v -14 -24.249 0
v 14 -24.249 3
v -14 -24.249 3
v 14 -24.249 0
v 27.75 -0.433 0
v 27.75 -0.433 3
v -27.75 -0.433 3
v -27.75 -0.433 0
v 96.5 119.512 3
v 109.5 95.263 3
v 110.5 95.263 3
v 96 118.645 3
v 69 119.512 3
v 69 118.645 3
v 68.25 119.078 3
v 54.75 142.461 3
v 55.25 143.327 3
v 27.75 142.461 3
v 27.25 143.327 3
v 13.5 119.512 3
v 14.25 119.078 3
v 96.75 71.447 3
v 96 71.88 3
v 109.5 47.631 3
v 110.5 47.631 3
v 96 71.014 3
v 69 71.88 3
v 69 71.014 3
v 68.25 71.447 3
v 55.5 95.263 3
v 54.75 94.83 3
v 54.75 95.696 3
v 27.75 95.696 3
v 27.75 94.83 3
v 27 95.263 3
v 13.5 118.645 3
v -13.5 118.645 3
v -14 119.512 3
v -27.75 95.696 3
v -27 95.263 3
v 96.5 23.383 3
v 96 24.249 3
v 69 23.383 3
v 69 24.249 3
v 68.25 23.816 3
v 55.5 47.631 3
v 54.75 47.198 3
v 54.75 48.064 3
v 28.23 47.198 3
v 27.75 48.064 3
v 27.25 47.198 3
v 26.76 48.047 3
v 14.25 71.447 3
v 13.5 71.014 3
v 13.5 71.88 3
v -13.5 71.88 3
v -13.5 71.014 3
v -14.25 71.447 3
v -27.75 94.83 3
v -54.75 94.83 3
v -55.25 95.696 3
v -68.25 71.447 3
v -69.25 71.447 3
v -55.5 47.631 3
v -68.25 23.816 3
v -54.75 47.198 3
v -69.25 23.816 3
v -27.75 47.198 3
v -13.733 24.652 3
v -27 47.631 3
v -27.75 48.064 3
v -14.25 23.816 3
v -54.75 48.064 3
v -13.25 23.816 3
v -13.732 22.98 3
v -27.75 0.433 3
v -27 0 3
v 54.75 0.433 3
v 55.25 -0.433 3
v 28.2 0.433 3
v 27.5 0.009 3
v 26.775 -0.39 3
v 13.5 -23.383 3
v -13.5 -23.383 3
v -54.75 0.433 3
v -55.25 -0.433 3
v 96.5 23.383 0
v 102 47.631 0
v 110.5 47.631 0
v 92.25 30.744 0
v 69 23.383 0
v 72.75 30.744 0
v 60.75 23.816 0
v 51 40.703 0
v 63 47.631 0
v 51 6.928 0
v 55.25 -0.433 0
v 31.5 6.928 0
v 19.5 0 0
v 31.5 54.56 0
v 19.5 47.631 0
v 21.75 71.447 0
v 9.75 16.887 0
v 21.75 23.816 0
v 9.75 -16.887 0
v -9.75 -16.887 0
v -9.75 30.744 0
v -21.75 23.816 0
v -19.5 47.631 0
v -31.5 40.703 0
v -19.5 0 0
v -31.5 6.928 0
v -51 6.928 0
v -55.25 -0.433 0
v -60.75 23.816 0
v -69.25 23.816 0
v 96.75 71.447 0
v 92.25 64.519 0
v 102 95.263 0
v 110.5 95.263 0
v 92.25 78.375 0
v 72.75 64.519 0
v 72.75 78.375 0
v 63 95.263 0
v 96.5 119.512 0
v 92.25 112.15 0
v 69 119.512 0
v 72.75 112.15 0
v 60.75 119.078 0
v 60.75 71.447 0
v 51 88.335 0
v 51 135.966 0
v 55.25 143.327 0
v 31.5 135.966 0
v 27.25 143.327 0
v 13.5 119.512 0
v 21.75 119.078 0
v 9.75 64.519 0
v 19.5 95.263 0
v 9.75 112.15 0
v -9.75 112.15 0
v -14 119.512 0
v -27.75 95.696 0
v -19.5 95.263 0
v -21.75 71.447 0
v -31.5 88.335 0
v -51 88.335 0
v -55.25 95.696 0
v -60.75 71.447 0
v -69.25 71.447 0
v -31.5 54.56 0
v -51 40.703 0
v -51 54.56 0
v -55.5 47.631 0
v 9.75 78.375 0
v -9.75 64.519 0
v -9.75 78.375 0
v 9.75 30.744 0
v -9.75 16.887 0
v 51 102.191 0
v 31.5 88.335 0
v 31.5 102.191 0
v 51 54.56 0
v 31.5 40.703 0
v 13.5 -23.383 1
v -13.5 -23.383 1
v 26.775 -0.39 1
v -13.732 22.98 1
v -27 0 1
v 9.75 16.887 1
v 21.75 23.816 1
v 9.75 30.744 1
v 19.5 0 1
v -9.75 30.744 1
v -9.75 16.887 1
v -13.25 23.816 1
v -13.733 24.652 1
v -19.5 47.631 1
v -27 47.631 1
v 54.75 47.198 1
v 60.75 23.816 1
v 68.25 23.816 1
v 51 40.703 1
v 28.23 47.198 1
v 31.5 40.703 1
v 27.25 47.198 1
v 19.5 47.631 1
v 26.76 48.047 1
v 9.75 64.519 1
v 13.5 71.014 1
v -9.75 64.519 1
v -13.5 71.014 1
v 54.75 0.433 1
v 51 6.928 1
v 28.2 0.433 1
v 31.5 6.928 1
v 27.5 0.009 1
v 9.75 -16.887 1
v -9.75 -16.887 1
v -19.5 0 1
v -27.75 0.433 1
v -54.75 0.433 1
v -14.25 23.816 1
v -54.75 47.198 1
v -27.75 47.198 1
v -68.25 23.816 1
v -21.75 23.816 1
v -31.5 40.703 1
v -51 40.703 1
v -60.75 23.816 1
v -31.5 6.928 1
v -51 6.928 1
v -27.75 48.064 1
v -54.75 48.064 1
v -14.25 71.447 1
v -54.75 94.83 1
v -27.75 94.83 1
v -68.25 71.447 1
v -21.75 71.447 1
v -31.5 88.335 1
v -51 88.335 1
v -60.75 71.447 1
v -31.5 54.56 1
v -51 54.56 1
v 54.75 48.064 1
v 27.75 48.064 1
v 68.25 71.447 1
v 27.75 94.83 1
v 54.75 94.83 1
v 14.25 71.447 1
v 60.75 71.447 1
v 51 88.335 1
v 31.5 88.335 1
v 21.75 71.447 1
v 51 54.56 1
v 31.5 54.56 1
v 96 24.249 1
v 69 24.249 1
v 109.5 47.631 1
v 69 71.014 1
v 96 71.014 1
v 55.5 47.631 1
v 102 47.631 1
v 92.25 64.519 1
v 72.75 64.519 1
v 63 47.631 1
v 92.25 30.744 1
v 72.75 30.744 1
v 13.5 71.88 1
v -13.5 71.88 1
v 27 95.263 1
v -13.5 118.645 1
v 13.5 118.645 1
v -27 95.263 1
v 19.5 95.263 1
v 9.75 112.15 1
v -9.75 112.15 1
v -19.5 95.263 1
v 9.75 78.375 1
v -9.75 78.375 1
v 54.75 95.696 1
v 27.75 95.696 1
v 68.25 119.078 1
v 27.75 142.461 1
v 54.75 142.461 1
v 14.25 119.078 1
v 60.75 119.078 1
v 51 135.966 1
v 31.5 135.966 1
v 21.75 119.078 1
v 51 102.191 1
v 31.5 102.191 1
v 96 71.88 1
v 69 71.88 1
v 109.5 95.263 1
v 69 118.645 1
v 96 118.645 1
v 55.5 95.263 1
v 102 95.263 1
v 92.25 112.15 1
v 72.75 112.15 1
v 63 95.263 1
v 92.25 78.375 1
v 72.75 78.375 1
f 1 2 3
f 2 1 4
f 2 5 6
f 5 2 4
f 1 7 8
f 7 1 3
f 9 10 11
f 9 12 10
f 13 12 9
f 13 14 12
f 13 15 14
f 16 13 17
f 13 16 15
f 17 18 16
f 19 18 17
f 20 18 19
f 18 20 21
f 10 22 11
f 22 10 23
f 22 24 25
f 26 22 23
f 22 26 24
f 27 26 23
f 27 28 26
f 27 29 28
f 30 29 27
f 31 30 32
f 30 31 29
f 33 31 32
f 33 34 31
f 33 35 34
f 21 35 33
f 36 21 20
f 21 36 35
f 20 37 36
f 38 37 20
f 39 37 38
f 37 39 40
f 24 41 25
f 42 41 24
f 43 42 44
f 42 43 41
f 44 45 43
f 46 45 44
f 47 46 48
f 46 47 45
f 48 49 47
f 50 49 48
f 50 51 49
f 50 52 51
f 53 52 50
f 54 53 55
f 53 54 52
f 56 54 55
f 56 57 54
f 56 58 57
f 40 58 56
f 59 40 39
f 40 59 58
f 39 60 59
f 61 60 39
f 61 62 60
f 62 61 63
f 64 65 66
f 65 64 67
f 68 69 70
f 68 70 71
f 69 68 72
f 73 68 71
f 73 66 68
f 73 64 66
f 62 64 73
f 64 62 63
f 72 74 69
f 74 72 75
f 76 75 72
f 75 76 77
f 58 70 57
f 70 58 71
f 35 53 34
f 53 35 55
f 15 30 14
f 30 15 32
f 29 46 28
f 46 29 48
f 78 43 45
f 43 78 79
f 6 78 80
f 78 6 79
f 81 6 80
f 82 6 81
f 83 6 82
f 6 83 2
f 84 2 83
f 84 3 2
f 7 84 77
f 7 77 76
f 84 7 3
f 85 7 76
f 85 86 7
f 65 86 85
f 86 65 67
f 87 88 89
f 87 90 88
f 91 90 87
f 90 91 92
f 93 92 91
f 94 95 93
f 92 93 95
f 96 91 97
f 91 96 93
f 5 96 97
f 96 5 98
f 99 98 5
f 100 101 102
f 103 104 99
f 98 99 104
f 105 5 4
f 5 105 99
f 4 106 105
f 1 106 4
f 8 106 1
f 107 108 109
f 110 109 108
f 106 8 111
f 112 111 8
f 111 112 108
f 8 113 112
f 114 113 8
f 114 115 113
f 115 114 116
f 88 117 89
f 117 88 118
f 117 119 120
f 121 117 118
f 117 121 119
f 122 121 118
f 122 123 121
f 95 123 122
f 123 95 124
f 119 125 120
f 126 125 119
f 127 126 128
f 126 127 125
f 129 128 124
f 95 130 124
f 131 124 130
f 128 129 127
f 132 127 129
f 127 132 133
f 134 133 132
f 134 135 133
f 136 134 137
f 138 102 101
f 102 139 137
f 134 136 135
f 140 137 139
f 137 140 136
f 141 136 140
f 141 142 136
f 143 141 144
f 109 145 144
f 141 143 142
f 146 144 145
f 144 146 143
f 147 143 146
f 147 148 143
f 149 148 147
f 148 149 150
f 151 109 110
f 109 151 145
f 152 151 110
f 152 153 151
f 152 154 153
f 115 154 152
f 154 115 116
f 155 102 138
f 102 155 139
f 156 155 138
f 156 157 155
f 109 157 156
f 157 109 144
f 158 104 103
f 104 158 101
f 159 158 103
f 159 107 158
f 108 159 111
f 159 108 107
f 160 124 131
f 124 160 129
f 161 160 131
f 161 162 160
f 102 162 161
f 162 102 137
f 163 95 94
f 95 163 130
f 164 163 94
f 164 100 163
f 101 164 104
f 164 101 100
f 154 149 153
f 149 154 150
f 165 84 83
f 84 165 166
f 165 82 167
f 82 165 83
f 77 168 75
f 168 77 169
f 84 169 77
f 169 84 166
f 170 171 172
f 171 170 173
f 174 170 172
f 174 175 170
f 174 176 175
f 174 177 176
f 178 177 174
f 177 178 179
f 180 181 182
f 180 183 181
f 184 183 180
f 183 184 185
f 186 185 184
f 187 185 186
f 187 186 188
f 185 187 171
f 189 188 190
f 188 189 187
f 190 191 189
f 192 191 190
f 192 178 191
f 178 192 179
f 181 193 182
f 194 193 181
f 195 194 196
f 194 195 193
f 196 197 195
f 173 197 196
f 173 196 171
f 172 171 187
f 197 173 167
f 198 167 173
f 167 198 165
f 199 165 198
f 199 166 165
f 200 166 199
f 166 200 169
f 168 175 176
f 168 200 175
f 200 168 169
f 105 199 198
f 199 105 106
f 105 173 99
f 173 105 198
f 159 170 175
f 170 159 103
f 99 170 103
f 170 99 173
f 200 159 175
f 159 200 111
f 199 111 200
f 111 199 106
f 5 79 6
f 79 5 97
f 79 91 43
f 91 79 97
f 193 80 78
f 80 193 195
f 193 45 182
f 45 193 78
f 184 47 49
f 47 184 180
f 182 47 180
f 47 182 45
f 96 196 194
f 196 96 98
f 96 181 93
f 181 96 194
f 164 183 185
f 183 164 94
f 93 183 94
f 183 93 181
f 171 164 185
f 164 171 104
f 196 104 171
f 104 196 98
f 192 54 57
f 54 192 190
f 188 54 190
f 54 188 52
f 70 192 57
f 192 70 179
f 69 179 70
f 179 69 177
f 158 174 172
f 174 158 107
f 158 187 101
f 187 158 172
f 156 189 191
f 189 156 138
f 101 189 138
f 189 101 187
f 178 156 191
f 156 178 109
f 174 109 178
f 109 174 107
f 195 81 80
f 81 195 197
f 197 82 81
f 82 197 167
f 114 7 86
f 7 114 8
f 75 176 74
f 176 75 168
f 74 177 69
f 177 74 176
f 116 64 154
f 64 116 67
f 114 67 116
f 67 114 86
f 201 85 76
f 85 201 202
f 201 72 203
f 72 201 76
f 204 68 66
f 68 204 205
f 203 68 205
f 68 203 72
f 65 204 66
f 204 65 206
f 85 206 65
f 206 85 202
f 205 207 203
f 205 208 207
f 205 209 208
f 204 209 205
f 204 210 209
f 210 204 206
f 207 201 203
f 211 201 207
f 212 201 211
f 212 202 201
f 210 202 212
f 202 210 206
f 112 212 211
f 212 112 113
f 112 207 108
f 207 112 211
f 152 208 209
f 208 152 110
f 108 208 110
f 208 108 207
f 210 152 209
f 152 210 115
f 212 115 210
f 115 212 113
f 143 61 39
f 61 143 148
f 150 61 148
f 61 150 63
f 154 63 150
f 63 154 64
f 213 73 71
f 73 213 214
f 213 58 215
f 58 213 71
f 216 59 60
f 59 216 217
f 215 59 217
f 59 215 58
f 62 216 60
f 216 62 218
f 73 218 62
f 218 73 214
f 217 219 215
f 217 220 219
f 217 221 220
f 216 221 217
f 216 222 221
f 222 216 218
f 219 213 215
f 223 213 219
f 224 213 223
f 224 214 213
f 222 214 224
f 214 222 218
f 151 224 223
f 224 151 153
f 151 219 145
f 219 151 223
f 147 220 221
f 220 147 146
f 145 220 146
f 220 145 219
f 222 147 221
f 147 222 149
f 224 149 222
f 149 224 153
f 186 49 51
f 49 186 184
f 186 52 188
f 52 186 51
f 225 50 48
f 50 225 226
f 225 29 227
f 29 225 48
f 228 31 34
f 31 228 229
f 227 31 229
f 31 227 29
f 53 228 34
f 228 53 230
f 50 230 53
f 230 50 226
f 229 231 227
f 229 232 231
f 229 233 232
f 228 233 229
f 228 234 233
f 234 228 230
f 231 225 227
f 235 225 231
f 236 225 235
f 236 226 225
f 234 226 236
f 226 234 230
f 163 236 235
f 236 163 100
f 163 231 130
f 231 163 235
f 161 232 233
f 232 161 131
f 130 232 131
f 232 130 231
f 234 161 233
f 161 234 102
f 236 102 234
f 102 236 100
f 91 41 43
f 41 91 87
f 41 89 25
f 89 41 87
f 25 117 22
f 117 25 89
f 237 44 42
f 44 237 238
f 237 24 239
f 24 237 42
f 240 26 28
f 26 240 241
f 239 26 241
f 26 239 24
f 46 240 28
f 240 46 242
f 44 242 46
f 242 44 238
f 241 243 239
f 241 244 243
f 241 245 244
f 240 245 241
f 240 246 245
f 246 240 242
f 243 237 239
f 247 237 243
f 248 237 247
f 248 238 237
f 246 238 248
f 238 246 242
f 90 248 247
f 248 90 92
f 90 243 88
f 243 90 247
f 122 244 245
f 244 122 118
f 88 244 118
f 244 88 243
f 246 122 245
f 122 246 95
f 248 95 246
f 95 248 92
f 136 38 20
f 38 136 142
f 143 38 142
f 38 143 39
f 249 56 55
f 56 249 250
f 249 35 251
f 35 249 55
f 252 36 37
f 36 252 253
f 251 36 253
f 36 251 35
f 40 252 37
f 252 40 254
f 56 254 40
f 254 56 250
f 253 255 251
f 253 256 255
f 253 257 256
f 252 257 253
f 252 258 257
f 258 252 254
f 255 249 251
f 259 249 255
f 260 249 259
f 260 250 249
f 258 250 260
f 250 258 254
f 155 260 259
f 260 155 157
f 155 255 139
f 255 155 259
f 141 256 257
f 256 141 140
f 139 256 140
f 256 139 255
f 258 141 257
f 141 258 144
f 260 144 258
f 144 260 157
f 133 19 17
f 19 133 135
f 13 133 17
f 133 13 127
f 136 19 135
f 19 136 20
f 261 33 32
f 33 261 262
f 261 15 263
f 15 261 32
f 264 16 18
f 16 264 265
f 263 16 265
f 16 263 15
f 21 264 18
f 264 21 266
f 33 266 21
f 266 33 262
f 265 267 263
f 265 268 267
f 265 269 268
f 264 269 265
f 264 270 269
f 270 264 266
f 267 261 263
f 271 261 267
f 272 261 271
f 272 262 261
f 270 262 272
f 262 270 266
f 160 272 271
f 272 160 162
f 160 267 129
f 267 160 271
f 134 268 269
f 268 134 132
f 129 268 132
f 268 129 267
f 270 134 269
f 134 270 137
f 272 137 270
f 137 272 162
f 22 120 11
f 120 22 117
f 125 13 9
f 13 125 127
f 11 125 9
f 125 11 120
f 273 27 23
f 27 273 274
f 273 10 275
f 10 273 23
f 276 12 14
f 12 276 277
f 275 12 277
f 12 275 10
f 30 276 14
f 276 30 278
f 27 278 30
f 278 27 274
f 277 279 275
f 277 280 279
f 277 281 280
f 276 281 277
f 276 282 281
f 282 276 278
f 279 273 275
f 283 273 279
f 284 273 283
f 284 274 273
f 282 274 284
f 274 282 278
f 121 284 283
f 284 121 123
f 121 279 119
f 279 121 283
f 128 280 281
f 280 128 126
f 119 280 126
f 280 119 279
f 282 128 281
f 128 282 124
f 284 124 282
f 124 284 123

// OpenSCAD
$fn = 150;

union() {
	difference() {
		union() {
			translate(v = [0.0, 0.0, 0]) {
				difference() {
					cylinder($fn = 6, d = 56.0, h = 3.0);
					translate(v = [0, 0, 1.0]) {
						cylinder($fn = 6, d = 54.0, h = 3.0);
					}
					translate(v = [0, 0, -1]) {
						cylinder($fn = 6, d = 39, h = 3.0);
					}
				}
			}
			translate(v = [41.25, 23.81569860407206, 0]) {
				difference() {
					cylinder($fn = 6, d = 56.0, h = 3.0);
					translate(v = [0, 0, 1.0]) {
						cylinder($fn = 6, d = 54.0, h = 3.0);
					}
					translate(v = [0, 0, -1]) {
						cylinder($fn = 6, d = 39, h = 3.0);
					}
				}
			}
			translate(v = [0.0, 47.63139720814412, 0]) {
				difference() {
					cylinder($fn = 6, d = 56.0, h = 3.0);
					translate(v = [0, 0, 1.0]) {
						cylinder($fn = 6, d = 54.0, h = 3.0);
					}
					translate(v = [0, 0, -1]) {
						cylinder($fn = 6, d = 39, h = 3.0);
					}
				}
			}
		}
		translate(v = [13.75, 23.824673200287624, 1.0]) {
			cylinder(d = 55.0, h = 3.5);
		}
	}
	translate(v = [-41.25, 23.81569860407206, 0]) {
		difference() {
			cylinder($fn = 6, d = 56.0, h = 3.0);
			translate(v = [0, 0, 1.0]) {
				cylinder($fn = 6, d = 54.0, h = 3.0);
			}
			translate(v = [0, 0, -1]) {
				cylinder($fn = 6, d = 39, h = 3.0);
			}
		}
	}
	translate(v = [-41.25, 71.44709581221619, 0]) {
		difference() {
			cylinder($fn = 6, d = 56.0, h = 3.0);
			translate(v = [0, 0, 1.0]) {
				cylinder($fn = 6, d = 54.0, h = 3.0);
			}
			translate(v = [0, 0, -1]) {
				cylinder($fn = 6, d = 39, h = 3.0);
			}
		}
	}
	translate(v = [41.25, 71.44709581221619, 0]) {
		difference() {
			cylinder($fn = 6, d = 56.0, h = 3.0);
			translate(v = [0, 0, 1.0]) {
				cylinder($fn = 6, d = 54.0, h = 3.0);
			}
			translate(v = [0, 0, -1]) {
				cylinder($fn = 6, d = 39, h = 3.0);
			}
		}
	}
	translate(v = [82.5, 47.63139720814412, 0]) {
		difference() {
			cylinder($fn = 6, d = 56.0, h = 3.0);
			translate(v = [0, 0, 1.0]) {
				cylinder($fn = 6, d = 54.0, h = 3.0);
			}
			translate(v = [0, 0, -1]) {
				cylinder($fn = 6, d = 39, h = 3.0);
			}
		}
	}
	translate(v = [0.0, 95.26279441628824, 0]) {
		difference() {
			cylinder($fn = 6, d = 56.0, h = 3.0);
			translate(v = [0, 0, 1.0]) {
				cylinder($fn = 6, d = 54.0, h = 3.0);
			}
			translate(v = [0, 0, -1]) {
				cylinder($fn = 6, d = 39, h = 3.0);
			}
		}
	}
	translate(v = [41.25, 119.0784930203603, 0]) {
		difference() {
			cylinder($fn = 6, d = 56.0, h = 3.0);
			translate(v = [0, 0, 1.0]) {
				cylinder($fn = 6, d = 54.0, h = 3.0);
			}
			translate(v = [0, 0, -1]) {
				cylinder($fn = 6, d = 39, h = 3.0);
			}
		}
	}
	translate(v = [82.5, 95.26279441628824, 0]) {
		difference() {
			cylinder($fn = 6, d = 56.0, h = 3.0);
			translate(v = [0, 0, 1.0]) {
				cylinder($fn = 6, d = 54.0, h = 3.0);
			}
			translate(v = [0, 0, -1]) {
				cylinder($fn = 6, d = 39, h = 3.0);
			}
		}
	}
}
